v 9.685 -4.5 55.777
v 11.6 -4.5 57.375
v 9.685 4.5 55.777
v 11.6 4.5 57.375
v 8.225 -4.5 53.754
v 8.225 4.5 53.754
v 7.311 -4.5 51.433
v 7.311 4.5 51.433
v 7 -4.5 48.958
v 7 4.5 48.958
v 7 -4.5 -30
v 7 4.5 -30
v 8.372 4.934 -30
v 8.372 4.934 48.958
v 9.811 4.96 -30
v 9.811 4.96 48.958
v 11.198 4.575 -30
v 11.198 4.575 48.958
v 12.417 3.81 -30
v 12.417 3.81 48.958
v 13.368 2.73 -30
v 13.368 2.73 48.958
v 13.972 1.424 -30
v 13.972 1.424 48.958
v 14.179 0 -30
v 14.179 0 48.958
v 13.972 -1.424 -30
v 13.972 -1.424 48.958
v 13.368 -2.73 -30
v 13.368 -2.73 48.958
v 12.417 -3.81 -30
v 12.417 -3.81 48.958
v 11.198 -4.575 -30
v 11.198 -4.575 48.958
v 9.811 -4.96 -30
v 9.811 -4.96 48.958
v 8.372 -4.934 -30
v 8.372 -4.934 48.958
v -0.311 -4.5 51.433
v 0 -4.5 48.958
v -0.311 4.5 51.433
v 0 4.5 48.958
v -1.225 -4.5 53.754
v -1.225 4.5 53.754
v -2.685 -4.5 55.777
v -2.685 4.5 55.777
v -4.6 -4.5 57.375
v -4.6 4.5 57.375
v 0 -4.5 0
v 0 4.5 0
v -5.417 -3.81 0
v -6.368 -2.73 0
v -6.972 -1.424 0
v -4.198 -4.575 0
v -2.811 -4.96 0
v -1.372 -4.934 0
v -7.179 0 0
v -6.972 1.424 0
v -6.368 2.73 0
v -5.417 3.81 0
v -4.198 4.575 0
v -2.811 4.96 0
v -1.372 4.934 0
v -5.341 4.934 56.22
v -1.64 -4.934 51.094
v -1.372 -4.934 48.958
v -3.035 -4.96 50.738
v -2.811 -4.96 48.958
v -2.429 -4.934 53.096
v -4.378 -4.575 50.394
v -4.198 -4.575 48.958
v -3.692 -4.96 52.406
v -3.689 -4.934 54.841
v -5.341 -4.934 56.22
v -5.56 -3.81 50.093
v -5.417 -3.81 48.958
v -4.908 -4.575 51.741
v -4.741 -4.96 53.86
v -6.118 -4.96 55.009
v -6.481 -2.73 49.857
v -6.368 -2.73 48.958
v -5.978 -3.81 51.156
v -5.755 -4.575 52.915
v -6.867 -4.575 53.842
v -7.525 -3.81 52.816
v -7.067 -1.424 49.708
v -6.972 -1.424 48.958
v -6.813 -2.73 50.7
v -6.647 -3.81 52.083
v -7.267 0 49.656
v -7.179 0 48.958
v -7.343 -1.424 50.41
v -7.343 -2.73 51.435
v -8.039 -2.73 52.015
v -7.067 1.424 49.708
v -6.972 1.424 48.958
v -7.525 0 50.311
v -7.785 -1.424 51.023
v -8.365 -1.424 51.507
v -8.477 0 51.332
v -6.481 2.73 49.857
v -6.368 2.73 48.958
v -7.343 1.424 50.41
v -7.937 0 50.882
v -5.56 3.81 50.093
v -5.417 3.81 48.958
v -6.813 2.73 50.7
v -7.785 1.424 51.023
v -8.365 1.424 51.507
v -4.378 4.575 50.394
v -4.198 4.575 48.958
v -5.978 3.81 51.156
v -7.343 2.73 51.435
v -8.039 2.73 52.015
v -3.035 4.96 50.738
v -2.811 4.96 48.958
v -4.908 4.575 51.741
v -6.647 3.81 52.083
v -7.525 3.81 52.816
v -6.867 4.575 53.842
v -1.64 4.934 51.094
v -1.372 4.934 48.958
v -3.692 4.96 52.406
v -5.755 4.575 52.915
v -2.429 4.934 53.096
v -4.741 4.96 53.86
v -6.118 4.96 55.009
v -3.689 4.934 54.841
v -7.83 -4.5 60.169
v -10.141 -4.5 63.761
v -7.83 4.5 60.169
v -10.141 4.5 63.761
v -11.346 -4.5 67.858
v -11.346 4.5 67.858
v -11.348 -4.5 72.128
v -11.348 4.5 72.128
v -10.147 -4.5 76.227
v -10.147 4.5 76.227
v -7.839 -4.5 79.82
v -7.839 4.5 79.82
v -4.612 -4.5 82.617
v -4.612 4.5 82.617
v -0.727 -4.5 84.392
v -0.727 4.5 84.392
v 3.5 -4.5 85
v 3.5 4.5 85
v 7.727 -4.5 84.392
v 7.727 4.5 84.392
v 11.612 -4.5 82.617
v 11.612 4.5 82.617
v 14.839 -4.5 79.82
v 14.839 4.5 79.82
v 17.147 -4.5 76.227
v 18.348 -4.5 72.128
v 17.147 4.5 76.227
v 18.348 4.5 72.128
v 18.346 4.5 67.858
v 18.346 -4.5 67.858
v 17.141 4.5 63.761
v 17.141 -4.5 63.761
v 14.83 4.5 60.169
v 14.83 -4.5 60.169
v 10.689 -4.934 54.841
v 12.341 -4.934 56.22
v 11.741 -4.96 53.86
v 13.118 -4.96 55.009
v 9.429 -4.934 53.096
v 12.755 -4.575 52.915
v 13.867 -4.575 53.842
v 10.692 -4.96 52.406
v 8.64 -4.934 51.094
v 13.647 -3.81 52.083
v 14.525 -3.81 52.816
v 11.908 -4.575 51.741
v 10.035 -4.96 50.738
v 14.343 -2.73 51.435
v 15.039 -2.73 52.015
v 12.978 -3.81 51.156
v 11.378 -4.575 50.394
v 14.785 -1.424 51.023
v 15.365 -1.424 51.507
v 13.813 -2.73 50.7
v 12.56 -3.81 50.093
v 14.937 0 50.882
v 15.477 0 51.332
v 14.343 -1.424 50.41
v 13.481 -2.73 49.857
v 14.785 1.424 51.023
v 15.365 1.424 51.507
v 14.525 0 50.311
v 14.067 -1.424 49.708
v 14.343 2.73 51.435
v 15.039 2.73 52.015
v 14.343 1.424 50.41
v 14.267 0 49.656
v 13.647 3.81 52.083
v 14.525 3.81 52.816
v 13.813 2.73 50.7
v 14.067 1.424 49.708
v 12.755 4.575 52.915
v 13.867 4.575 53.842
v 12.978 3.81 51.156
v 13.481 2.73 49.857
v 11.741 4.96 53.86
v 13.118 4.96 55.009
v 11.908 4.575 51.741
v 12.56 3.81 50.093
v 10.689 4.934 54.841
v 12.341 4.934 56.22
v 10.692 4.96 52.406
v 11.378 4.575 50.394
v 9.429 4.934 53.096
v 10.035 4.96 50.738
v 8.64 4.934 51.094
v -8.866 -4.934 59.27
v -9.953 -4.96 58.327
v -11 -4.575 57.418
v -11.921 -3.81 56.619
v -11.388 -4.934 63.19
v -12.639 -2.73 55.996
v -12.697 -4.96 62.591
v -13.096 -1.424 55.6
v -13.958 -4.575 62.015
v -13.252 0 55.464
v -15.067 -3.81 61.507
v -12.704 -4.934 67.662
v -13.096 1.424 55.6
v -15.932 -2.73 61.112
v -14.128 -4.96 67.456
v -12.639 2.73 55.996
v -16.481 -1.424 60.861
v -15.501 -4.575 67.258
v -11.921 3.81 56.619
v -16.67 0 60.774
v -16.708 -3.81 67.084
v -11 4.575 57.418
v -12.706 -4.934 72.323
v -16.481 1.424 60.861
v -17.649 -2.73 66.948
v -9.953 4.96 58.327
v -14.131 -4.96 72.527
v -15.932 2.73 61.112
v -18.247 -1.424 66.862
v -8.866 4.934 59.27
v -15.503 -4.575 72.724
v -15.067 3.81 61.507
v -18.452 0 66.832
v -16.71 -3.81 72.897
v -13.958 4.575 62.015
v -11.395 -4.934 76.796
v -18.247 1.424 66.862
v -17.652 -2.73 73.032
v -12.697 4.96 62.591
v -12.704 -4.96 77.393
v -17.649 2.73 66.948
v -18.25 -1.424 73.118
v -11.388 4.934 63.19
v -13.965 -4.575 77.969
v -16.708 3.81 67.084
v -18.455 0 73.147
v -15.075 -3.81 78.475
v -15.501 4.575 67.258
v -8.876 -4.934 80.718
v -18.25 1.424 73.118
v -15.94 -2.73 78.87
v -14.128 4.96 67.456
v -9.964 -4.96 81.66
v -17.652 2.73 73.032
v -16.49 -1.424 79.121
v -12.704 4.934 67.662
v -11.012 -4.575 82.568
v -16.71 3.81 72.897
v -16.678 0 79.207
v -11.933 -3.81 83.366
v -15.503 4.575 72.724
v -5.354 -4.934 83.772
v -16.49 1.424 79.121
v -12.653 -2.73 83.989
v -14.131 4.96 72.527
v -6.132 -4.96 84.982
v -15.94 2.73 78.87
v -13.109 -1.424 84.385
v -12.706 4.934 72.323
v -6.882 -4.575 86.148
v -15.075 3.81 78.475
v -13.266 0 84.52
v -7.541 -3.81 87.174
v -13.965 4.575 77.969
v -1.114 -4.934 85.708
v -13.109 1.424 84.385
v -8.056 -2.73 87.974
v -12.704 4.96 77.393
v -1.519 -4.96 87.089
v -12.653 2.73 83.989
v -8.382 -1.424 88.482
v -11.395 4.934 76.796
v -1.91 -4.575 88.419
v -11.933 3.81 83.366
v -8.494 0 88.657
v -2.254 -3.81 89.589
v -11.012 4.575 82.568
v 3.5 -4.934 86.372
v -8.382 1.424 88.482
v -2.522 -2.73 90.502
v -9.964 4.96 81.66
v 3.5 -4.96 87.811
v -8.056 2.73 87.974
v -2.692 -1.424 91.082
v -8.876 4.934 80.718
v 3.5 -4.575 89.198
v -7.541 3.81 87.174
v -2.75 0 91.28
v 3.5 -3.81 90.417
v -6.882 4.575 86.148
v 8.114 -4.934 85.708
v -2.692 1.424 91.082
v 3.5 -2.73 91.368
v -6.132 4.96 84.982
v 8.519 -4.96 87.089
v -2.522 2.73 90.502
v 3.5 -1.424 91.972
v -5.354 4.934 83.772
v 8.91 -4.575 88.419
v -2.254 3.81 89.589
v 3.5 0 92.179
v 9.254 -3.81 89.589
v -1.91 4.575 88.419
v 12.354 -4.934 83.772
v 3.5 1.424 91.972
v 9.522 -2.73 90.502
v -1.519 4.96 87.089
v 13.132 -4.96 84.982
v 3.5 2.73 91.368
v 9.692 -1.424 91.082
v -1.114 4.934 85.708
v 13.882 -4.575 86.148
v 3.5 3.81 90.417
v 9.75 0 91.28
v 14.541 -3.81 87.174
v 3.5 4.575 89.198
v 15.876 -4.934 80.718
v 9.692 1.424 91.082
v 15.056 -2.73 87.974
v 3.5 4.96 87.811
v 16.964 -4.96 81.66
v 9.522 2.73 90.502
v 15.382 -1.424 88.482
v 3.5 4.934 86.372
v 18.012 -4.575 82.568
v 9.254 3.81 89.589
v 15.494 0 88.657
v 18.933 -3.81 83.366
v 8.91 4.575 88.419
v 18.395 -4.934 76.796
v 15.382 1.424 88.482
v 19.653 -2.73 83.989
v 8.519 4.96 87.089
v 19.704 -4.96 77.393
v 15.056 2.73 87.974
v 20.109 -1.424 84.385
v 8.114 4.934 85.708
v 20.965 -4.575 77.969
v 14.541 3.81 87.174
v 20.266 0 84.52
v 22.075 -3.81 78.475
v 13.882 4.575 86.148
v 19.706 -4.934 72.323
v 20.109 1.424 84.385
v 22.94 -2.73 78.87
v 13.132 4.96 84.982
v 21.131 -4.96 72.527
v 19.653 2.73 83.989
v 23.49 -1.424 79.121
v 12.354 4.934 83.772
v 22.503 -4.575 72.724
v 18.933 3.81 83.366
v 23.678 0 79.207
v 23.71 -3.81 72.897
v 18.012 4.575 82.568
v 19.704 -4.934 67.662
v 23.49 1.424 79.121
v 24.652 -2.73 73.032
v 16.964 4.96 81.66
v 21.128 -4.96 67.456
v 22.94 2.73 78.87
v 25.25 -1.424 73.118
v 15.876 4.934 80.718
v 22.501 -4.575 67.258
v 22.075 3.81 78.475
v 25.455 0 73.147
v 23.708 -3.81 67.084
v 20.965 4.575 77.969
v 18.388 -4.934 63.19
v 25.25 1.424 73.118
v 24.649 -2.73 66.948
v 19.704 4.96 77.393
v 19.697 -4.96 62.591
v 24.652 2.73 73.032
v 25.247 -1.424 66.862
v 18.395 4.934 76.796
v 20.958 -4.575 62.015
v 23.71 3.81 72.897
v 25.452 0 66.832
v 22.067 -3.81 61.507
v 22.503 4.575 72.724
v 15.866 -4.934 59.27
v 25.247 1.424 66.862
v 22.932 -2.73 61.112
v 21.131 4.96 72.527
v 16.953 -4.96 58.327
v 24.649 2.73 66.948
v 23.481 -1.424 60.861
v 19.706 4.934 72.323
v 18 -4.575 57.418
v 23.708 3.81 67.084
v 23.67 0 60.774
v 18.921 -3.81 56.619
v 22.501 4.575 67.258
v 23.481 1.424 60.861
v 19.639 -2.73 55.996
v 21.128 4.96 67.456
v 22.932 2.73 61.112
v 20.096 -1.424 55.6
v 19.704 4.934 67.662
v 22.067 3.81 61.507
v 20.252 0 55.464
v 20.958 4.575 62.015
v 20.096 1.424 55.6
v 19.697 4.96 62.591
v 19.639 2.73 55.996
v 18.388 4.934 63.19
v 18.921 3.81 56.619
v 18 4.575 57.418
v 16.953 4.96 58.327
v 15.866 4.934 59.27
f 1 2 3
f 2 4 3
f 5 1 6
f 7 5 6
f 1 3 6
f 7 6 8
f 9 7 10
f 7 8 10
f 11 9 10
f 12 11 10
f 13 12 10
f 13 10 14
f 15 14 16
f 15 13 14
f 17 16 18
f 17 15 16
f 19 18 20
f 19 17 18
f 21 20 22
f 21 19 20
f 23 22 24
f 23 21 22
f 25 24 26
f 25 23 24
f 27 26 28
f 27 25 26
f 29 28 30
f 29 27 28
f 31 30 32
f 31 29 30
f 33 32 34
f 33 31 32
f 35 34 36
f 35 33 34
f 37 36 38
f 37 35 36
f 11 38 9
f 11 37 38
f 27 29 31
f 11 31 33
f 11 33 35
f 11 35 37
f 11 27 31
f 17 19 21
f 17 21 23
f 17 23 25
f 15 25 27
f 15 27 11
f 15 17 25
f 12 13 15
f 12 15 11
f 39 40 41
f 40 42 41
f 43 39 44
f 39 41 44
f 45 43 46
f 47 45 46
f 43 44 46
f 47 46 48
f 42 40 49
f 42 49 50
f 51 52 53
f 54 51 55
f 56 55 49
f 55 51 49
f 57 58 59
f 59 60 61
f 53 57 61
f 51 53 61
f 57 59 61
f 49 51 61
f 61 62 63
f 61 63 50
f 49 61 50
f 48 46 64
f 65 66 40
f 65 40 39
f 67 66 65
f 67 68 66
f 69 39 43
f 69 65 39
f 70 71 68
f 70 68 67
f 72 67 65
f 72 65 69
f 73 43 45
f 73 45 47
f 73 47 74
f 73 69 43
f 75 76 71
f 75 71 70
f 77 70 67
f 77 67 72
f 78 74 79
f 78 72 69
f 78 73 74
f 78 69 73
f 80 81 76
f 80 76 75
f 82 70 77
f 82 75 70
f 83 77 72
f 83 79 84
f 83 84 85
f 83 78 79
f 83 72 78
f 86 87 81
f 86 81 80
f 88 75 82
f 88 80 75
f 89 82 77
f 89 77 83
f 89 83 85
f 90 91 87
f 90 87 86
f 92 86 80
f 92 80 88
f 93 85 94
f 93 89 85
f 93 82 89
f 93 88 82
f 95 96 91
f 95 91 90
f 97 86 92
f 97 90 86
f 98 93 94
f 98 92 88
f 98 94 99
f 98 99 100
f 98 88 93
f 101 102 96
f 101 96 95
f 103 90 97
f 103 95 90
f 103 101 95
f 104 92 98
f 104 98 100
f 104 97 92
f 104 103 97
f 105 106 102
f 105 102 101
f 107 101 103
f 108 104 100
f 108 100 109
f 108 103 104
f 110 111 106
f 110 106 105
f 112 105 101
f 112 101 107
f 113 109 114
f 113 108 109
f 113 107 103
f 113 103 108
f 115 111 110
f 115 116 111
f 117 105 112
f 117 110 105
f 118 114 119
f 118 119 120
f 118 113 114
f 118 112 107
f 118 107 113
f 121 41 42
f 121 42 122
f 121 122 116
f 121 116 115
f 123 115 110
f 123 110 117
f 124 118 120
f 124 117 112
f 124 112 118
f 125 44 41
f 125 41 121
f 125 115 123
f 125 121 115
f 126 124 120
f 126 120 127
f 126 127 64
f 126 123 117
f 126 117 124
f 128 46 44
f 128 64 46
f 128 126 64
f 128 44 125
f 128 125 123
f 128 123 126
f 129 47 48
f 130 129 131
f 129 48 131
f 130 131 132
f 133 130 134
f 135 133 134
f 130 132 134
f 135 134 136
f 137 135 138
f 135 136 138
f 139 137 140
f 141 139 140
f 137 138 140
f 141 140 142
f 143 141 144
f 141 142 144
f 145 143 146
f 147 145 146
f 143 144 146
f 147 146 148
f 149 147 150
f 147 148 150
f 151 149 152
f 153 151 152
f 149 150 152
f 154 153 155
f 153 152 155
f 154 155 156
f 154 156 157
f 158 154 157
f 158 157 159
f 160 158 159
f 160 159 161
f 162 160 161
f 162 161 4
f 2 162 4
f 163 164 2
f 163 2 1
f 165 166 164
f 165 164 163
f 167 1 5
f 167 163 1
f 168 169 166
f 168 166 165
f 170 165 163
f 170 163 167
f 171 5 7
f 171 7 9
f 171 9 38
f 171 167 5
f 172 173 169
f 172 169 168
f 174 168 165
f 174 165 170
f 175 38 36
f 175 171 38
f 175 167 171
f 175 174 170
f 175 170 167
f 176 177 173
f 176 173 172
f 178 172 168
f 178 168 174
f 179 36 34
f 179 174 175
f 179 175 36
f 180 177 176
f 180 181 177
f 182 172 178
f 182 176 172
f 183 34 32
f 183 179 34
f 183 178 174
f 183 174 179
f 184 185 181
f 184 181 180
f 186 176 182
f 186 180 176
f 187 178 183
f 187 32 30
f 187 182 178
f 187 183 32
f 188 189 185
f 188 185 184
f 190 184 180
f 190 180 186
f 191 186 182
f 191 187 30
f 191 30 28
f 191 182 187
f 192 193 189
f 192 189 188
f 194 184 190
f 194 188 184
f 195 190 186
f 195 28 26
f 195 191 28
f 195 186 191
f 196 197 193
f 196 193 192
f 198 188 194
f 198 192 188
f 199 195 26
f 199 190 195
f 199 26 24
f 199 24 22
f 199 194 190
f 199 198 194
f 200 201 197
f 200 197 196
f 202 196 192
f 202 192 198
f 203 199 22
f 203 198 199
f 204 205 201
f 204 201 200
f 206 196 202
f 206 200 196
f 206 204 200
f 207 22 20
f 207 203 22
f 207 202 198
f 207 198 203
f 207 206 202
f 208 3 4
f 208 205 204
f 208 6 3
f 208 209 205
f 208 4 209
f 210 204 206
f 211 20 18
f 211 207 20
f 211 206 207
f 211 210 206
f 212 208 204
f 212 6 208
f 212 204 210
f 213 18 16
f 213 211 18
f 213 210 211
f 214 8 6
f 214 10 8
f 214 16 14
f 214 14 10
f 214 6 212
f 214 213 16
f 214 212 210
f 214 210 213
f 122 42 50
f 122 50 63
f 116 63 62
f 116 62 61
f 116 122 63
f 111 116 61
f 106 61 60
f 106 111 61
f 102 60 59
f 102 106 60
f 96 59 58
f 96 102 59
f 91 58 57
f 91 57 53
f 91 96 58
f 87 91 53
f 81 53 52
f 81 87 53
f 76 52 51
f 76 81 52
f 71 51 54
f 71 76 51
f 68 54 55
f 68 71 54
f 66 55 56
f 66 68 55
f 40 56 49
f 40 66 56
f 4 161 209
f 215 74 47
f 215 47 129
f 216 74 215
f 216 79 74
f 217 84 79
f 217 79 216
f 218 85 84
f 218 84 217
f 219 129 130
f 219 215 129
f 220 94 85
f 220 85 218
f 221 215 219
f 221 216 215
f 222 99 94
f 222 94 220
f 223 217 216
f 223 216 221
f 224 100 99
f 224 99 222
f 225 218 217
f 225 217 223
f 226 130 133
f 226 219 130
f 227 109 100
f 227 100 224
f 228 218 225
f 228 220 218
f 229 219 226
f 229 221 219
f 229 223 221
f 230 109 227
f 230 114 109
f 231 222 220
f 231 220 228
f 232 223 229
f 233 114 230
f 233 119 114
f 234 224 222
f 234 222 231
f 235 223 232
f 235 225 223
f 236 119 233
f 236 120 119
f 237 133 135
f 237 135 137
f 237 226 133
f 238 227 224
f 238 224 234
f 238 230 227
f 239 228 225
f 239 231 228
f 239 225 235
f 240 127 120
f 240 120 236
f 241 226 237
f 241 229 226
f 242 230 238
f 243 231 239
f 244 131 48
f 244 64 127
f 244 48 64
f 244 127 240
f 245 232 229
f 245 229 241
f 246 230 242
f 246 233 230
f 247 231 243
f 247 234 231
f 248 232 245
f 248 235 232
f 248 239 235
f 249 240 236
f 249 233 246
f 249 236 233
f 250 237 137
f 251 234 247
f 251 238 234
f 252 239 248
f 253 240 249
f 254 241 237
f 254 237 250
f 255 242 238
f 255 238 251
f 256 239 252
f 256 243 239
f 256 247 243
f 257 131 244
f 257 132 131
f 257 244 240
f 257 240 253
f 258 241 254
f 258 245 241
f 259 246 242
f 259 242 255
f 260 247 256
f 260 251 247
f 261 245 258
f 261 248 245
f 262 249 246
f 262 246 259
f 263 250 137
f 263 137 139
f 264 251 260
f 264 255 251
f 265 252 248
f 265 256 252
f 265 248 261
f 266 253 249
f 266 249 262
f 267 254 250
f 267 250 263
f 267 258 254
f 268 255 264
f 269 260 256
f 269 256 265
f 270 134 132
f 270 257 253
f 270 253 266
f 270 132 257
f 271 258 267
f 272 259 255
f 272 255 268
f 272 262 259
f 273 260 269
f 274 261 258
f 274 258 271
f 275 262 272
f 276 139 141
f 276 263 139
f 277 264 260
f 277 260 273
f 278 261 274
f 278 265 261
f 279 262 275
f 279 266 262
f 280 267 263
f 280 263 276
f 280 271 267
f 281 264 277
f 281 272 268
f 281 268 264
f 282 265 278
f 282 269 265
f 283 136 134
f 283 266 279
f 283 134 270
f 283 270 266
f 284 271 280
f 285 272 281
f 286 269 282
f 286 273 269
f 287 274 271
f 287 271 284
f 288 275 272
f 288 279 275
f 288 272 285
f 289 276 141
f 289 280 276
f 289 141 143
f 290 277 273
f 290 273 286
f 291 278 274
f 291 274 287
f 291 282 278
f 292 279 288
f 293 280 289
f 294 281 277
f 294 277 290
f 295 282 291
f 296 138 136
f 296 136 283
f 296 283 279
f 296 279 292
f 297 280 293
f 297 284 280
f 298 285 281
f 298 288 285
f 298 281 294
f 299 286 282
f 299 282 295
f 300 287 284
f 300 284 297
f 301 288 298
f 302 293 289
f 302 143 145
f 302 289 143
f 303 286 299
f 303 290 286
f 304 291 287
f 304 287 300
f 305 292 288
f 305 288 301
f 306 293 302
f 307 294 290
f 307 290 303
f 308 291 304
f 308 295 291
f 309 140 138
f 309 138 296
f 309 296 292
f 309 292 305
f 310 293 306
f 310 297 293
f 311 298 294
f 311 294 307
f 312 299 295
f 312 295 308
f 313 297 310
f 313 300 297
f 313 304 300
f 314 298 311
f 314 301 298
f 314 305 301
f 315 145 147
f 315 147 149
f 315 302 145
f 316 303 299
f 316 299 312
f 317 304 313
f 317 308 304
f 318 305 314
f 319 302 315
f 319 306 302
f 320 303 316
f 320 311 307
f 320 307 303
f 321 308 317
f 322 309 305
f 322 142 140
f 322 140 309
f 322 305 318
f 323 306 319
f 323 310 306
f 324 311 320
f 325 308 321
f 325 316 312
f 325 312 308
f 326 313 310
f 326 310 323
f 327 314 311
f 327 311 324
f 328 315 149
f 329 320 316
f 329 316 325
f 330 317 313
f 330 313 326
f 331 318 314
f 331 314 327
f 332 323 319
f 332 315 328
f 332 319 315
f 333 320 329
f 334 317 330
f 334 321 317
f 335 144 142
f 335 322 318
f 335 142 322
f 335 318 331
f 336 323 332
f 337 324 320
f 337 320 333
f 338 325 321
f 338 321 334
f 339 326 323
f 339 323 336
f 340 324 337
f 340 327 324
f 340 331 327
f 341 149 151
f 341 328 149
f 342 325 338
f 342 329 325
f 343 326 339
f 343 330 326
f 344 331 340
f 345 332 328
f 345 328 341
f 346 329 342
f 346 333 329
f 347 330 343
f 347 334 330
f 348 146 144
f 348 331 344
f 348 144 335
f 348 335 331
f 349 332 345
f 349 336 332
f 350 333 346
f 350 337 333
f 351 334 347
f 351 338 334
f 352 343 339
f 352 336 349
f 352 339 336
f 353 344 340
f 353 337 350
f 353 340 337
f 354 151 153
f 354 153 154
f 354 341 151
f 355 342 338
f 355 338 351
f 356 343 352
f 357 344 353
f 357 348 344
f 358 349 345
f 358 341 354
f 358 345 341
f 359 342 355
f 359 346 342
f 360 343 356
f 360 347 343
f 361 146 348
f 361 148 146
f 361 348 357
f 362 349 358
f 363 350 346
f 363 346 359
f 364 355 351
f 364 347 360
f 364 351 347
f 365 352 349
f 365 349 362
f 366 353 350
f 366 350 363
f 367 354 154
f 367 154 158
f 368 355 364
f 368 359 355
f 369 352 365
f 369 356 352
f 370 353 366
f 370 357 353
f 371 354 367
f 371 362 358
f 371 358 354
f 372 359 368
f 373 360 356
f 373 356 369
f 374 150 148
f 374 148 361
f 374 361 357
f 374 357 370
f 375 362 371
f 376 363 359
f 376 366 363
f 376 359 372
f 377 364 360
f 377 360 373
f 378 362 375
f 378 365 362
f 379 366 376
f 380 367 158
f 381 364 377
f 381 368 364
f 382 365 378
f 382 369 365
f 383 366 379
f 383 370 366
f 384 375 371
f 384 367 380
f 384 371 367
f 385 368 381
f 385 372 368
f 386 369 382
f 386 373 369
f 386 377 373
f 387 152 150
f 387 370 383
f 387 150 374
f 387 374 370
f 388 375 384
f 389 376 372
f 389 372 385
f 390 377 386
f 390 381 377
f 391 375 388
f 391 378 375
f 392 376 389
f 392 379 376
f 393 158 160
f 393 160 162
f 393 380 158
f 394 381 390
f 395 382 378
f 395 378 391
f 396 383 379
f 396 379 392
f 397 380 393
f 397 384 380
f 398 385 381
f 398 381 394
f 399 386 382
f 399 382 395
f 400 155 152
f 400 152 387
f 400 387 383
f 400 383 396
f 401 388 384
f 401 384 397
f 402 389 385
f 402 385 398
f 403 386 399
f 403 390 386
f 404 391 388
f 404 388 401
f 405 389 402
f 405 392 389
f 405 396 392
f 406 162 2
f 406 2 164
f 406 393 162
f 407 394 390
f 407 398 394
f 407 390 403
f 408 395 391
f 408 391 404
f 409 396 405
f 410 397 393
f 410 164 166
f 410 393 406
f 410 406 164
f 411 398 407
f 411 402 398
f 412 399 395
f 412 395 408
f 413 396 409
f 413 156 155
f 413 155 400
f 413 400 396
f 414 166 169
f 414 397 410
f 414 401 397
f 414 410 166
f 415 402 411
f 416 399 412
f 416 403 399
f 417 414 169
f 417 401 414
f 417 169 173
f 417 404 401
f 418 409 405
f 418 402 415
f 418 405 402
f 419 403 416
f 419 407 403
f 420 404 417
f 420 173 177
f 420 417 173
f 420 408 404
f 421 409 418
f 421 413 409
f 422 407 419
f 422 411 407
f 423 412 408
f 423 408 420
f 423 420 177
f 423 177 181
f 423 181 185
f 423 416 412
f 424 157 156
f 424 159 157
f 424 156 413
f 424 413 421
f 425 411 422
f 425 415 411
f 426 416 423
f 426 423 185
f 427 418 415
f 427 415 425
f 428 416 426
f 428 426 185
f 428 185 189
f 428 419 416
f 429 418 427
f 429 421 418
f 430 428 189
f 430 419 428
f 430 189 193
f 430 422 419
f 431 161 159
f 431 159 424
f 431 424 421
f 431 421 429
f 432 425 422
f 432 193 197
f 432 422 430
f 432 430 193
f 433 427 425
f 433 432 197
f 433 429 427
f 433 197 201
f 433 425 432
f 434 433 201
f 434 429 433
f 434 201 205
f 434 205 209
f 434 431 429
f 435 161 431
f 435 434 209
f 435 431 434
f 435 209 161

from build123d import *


with BuildPart() as f2:
    # F2: sweep along a path in F1
    with BuildLine(Plane.XZ) as f2_path:
        Line((0, 0), (0, 48.9583745875))
        ThreePointArc((0, 48.9583745875), (-1.2250356126, 53.7542061108), (-4.6, 57.3750247525))
        ThreePointArc((-4.6, 57.3750247525), (3.5, 85), (11.6, 57.3750247525))
        ThreePointArc((11.6, 57.3750247525), (8.2250356126, 53.7542061108), (7, 48.9583745875))
        Line((7, 48.9583745875), (7, -30))
    # F0 (on Top) → F2 (sweep)
    with BuildSketch(Plane.XY):
        with BuildLine():
            Line((0, -4.5), (0, 4.5))
            ThreePointArc((0, 4.5), (-7.1794494718, 0), (0, -4.5))
        make_face()
    sweep(path=f2_path.line)


solid = f2.part
